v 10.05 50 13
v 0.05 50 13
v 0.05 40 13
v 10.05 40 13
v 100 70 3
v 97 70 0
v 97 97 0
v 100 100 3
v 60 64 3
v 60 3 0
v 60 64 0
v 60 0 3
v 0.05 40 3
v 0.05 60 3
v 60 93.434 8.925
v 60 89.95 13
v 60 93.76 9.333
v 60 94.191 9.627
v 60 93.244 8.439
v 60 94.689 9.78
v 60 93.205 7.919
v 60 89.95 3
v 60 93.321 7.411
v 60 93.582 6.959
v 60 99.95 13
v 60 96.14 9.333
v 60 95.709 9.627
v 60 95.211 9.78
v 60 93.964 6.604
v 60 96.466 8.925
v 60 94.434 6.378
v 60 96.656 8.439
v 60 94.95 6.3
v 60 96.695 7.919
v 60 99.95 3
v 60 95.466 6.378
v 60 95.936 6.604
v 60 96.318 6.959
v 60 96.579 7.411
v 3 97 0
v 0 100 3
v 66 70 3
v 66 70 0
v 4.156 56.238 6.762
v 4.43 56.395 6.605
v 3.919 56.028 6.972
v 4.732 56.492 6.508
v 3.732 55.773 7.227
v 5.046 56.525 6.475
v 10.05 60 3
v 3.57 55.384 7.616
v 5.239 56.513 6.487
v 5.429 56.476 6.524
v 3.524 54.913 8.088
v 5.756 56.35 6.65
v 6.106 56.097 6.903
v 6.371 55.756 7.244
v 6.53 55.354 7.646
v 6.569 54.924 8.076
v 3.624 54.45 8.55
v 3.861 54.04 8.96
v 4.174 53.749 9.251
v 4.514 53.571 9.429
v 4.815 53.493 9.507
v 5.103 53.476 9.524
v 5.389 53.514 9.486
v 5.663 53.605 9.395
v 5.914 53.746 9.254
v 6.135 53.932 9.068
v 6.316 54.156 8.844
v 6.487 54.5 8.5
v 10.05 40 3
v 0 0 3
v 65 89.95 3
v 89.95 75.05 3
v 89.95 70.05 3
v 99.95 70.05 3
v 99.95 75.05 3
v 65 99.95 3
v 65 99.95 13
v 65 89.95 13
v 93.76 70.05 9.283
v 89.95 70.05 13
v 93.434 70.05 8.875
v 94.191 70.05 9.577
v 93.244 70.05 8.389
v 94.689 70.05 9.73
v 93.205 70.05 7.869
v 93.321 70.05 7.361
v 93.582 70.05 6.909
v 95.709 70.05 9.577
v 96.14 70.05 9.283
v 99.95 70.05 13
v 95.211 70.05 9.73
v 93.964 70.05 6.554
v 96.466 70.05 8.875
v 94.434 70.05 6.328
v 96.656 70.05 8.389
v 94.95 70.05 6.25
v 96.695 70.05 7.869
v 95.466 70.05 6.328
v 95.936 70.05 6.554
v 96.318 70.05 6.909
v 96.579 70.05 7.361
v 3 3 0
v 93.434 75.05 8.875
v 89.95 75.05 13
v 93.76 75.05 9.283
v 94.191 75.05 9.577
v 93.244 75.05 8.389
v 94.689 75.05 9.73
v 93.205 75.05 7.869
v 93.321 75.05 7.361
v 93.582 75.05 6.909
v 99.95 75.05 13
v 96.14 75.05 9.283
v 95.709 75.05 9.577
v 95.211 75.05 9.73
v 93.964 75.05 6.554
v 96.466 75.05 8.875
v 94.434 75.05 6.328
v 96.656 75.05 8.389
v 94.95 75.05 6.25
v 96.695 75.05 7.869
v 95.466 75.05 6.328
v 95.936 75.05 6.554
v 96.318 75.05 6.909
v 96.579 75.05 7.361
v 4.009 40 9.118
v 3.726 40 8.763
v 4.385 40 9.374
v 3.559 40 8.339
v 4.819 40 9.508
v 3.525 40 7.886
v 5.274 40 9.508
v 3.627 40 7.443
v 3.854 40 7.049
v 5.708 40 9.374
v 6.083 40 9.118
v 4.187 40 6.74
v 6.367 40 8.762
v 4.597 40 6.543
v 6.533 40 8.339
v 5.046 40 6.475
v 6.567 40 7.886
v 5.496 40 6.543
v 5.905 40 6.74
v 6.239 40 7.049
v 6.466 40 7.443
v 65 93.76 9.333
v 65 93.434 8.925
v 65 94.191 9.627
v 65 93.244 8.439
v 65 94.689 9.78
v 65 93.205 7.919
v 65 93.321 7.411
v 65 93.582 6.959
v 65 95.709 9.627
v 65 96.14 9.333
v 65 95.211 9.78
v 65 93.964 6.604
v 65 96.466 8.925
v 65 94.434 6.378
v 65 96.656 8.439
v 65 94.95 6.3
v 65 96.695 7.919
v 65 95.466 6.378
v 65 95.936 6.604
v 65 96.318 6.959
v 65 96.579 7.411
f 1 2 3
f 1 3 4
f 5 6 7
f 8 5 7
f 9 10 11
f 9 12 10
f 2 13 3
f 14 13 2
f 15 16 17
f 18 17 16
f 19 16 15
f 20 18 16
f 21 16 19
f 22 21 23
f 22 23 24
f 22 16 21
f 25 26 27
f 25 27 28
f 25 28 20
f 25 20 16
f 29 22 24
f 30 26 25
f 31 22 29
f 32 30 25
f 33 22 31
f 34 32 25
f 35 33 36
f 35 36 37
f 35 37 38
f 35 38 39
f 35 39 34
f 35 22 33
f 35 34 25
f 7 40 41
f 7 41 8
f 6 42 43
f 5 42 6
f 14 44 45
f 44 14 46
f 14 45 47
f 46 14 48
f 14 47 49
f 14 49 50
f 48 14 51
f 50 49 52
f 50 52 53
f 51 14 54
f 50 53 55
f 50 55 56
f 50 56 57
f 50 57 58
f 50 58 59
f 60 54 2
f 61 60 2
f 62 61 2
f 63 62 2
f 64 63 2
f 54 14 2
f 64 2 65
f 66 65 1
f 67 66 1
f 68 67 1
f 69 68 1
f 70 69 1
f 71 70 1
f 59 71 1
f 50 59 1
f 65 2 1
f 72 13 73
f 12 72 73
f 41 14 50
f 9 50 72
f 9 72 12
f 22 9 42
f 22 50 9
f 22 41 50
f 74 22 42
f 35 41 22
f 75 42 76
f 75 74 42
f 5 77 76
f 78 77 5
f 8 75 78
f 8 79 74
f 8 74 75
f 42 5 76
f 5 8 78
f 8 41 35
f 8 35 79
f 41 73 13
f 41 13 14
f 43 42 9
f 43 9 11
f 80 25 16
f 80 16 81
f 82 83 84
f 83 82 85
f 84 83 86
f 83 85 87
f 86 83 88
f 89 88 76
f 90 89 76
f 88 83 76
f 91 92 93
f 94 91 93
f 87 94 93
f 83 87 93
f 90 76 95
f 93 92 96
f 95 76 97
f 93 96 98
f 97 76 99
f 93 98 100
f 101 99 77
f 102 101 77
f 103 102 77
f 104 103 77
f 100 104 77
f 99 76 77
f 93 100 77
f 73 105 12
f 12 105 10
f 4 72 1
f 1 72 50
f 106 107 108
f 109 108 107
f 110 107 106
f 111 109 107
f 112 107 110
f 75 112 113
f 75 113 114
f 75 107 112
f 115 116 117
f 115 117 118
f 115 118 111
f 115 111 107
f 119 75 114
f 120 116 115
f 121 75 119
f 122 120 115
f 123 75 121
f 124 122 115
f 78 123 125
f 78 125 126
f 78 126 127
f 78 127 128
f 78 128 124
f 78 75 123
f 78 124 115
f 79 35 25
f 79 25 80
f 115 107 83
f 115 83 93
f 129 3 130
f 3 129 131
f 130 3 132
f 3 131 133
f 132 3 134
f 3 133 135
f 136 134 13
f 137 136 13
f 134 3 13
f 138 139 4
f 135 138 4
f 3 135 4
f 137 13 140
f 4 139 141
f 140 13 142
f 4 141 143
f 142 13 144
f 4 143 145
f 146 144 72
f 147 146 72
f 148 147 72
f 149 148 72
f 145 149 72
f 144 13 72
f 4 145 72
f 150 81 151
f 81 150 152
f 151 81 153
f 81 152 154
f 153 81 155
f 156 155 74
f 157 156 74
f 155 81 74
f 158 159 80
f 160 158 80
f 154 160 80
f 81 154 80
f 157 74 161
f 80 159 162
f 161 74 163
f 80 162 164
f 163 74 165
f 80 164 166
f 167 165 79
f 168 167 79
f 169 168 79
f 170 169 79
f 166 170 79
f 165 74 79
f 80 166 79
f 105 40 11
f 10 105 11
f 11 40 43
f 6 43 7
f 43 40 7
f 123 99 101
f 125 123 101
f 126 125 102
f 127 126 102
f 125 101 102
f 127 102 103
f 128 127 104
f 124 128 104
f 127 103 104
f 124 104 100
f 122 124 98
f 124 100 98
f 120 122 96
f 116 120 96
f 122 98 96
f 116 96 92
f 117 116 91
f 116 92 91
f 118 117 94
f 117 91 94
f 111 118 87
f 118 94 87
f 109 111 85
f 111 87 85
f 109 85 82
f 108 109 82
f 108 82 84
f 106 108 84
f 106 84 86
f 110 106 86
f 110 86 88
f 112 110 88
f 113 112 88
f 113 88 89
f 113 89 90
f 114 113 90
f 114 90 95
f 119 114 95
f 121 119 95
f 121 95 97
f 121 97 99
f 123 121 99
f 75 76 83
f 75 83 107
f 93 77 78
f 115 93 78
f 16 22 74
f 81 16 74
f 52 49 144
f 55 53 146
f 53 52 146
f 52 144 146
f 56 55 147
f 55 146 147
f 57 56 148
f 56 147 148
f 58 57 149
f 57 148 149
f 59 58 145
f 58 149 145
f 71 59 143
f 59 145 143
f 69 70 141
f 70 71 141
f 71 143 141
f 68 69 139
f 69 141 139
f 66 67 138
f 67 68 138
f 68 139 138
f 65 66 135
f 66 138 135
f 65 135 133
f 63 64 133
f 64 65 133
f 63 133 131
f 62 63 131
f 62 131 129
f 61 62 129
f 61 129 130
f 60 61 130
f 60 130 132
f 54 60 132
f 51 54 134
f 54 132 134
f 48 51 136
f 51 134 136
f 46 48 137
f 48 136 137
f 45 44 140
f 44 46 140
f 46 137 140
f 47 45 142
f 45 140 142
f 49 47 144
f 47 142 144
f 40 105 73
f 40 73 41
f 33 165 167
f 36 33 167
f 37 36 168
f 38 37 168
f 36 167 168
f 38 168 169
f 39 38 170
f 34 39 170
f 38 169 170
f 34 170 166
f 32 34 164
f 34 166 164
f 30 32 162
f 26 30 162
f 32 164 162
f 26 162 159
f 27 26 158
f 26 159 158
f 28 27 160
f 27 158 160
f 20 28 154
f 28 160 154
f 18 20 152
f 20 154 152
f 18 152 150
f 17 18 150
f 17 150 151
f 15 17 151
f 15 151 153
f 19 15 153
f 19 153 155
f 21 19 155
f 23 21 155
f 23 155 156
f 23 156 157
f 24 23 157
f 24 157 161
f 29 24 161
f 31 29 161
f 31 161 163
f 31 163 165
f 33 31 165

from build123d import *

# Parameters (mm, degrees)
ESQUISSE1_W             = 100
ESQUISSE1_H             = 100
BOSS_EXTRU_1_DEPTH      = 3
ESQUISSE2_W             = 10
ESQUISSE2_H             = 20
BOSS_EXTRU_2_DEPTH      = 10
CHANFREIN1_SIZE         = 10
ESQUISSE3_R             = 1.525
ENL_V_MAT_EXTRU_1_DEPTH = 118.3413823
CHANFREIN2_SIZE         = 3
ESQUISSE4_W             = 5
ESQUISSE4_H             = 10
BOSS_EXTRU_3_DEPTH      = 10
ESQUISSE5_R             = 1.75
ENL_V_MAT_EXTRU_2_DEPTH = 10
ESQUISSE6_W             = 55.202992824
ESQUISSE6_H             = 76.399934011
ENL_V_MAT_EXTRU_3_DEPTH = 10
ESQUISSE9_W             = 10
ESQUISSE9_H             = 5
BOSS_EXTRU_5_DEPTH      = 10
ESQUISSE10_R            = 1.75
ENL_V_MAT_EXTRU_5_DEPTH = 10
CHANFREIN3_SIZE         = 6


with BuildPart() as part:
    # Esquisse1 → Boss.-Extru.1 (new body)
    with BuildSketch(Plane.XY):
        with Locations((50, 50)):
            Rectangle(ESQUISSE1_W, ESQUISSE1_H)
    extrude(amount=BOSS_EXTRU_1_DEPTH)

    # Esquisse2 → Boss.-Extru.2 (add)
    with BuildSketch(Plane.XY.offset(3)):
        with Locations((5.05, 50)):
            Rectangle(ESQUISSE2_W, ESQUISSE2_H)
        with Locations((94.95, 50)):
            Rectangle(ESQUISSE2_W, ESQUISSE2_H)
    extrude(amount=BOSS_EXTRU_2_DEPTH)

    # Chanfrein1
    chanfrein1_edges = [part.edges().sort_by_distance(p)[0] for p in [
        (94.95, 60, 13),
        (5.05, 60, 13),
    ]]
    chamfer(chanfrein1_edges, length=CHANFREIN1_SIZE - 0.0001)  # a hair under: the kernel refuses the full size

    # Esquisse3 → Enlèv. mat.-Extru.1 (cut, through all)
    with BuildSketch(Plane.XZ.offset(-40)):
        with Locations(Location((5.046227865, 8, 0), (0, 0, 270))):
            Circle(ESQUISSE3_R)
        with Locations(Location((94.95, 8, 0), (0, 0, 270))):
            Circle(ESQUISSE3_R)
    extrude(amount=-ENL_V_MAT_EXTRU_1_DEPTH, mode=Mode.SUBTRACT)

    # Chanfrein2
    chanfrein2_edges = [part.edges().sort_by_distance(p)[0] for p in [
        (50, 0, 0),
        (100, 50, 0),
        (50, 100, 0),
        (0, 50, 0),
    ]]
    chamfer(chanfrein2_edges, length=CHANFREIN2_SIZE - 0.0001)  # a hair under: the kernel refuses the full size

    # Esquisse4 → Boss.-Extru.3 (add)
    with BuildSketch(Plane.XY.offset(3)):
        with Locations((62.5, 94.95)):
            Rectangle(ESQUISSE4_W, ESQUISSE4_H)
    extrude(amount=BOSS_EXTRU_3_DEPTH)

    # Esquisse5 → Enlèv. mat.-Extru.2 (cut)
    with BuildSketch(Plane(origin=(65, 0, 0), x_dir=(0, 0, -1), z_dir=(1, 0, 0))):
        with Locations((-8.05, 94.95)):
            Circle(ESQUISSE5_R)
    extrude(amount=-ENL_V_MAT_EXTRU_2_DEPTH, mode=Mode.SUBTRACT)

    # Esquisse6 → Enlèv. mat.-Extru.3 (cut)
    with BuildSketch(Plane.XY.offset(3)):
        with Locations((87.601496412, 31.800032995)):
            Rectangle(ESQUISSE6_W, ESQUISSE6_H)
    extrude(amount=-ENL_V_MAT_EXTRU_3_DEPTH, mode=Mode.SUBTRACT)


with BuildPart() as body_2:
    # of the pieces the cut leaves, the one that is kept (enl_v_mat_extru_3_keep)
    add(part.part.solids().sort_by_distance((0, 100, 2.9999))[0])

    # Esquisse9 → Boss.-Extru.5 (add)
    with BuildSketch(Plane.XY.offset(3)):
        with Locations((94.95, 72.55)):
            Rectangle(ESQUISSE9_W, ESQUISSE9_H)
    extrude(amount=BOSS_EXTRU_5_DEPTH)

    # Esquisse10 → Enlèv. mat.-Extru.5 (cut)
    with BuildSketch(Plane.XZ.offset(-70)):
        with Locations(Location((94.95, 8, 0), (0, 0, 270))):
            Circle(ESQUISSE10_R)
    extrude(amount=-ENL_V_MAT_EXTRU_5_DEPTH, mode=Mode.SUBTRACT)

    # Chanfrein3
    chanfrein3_edges = [body_2.edges().sort_by_distance(p)[0] for p in [
        (60, 70, 1.5),
    ]]
    chamfer(chanfrein3_edges, length=CHANFREIN3_SIZE)


solid = body_2.part
